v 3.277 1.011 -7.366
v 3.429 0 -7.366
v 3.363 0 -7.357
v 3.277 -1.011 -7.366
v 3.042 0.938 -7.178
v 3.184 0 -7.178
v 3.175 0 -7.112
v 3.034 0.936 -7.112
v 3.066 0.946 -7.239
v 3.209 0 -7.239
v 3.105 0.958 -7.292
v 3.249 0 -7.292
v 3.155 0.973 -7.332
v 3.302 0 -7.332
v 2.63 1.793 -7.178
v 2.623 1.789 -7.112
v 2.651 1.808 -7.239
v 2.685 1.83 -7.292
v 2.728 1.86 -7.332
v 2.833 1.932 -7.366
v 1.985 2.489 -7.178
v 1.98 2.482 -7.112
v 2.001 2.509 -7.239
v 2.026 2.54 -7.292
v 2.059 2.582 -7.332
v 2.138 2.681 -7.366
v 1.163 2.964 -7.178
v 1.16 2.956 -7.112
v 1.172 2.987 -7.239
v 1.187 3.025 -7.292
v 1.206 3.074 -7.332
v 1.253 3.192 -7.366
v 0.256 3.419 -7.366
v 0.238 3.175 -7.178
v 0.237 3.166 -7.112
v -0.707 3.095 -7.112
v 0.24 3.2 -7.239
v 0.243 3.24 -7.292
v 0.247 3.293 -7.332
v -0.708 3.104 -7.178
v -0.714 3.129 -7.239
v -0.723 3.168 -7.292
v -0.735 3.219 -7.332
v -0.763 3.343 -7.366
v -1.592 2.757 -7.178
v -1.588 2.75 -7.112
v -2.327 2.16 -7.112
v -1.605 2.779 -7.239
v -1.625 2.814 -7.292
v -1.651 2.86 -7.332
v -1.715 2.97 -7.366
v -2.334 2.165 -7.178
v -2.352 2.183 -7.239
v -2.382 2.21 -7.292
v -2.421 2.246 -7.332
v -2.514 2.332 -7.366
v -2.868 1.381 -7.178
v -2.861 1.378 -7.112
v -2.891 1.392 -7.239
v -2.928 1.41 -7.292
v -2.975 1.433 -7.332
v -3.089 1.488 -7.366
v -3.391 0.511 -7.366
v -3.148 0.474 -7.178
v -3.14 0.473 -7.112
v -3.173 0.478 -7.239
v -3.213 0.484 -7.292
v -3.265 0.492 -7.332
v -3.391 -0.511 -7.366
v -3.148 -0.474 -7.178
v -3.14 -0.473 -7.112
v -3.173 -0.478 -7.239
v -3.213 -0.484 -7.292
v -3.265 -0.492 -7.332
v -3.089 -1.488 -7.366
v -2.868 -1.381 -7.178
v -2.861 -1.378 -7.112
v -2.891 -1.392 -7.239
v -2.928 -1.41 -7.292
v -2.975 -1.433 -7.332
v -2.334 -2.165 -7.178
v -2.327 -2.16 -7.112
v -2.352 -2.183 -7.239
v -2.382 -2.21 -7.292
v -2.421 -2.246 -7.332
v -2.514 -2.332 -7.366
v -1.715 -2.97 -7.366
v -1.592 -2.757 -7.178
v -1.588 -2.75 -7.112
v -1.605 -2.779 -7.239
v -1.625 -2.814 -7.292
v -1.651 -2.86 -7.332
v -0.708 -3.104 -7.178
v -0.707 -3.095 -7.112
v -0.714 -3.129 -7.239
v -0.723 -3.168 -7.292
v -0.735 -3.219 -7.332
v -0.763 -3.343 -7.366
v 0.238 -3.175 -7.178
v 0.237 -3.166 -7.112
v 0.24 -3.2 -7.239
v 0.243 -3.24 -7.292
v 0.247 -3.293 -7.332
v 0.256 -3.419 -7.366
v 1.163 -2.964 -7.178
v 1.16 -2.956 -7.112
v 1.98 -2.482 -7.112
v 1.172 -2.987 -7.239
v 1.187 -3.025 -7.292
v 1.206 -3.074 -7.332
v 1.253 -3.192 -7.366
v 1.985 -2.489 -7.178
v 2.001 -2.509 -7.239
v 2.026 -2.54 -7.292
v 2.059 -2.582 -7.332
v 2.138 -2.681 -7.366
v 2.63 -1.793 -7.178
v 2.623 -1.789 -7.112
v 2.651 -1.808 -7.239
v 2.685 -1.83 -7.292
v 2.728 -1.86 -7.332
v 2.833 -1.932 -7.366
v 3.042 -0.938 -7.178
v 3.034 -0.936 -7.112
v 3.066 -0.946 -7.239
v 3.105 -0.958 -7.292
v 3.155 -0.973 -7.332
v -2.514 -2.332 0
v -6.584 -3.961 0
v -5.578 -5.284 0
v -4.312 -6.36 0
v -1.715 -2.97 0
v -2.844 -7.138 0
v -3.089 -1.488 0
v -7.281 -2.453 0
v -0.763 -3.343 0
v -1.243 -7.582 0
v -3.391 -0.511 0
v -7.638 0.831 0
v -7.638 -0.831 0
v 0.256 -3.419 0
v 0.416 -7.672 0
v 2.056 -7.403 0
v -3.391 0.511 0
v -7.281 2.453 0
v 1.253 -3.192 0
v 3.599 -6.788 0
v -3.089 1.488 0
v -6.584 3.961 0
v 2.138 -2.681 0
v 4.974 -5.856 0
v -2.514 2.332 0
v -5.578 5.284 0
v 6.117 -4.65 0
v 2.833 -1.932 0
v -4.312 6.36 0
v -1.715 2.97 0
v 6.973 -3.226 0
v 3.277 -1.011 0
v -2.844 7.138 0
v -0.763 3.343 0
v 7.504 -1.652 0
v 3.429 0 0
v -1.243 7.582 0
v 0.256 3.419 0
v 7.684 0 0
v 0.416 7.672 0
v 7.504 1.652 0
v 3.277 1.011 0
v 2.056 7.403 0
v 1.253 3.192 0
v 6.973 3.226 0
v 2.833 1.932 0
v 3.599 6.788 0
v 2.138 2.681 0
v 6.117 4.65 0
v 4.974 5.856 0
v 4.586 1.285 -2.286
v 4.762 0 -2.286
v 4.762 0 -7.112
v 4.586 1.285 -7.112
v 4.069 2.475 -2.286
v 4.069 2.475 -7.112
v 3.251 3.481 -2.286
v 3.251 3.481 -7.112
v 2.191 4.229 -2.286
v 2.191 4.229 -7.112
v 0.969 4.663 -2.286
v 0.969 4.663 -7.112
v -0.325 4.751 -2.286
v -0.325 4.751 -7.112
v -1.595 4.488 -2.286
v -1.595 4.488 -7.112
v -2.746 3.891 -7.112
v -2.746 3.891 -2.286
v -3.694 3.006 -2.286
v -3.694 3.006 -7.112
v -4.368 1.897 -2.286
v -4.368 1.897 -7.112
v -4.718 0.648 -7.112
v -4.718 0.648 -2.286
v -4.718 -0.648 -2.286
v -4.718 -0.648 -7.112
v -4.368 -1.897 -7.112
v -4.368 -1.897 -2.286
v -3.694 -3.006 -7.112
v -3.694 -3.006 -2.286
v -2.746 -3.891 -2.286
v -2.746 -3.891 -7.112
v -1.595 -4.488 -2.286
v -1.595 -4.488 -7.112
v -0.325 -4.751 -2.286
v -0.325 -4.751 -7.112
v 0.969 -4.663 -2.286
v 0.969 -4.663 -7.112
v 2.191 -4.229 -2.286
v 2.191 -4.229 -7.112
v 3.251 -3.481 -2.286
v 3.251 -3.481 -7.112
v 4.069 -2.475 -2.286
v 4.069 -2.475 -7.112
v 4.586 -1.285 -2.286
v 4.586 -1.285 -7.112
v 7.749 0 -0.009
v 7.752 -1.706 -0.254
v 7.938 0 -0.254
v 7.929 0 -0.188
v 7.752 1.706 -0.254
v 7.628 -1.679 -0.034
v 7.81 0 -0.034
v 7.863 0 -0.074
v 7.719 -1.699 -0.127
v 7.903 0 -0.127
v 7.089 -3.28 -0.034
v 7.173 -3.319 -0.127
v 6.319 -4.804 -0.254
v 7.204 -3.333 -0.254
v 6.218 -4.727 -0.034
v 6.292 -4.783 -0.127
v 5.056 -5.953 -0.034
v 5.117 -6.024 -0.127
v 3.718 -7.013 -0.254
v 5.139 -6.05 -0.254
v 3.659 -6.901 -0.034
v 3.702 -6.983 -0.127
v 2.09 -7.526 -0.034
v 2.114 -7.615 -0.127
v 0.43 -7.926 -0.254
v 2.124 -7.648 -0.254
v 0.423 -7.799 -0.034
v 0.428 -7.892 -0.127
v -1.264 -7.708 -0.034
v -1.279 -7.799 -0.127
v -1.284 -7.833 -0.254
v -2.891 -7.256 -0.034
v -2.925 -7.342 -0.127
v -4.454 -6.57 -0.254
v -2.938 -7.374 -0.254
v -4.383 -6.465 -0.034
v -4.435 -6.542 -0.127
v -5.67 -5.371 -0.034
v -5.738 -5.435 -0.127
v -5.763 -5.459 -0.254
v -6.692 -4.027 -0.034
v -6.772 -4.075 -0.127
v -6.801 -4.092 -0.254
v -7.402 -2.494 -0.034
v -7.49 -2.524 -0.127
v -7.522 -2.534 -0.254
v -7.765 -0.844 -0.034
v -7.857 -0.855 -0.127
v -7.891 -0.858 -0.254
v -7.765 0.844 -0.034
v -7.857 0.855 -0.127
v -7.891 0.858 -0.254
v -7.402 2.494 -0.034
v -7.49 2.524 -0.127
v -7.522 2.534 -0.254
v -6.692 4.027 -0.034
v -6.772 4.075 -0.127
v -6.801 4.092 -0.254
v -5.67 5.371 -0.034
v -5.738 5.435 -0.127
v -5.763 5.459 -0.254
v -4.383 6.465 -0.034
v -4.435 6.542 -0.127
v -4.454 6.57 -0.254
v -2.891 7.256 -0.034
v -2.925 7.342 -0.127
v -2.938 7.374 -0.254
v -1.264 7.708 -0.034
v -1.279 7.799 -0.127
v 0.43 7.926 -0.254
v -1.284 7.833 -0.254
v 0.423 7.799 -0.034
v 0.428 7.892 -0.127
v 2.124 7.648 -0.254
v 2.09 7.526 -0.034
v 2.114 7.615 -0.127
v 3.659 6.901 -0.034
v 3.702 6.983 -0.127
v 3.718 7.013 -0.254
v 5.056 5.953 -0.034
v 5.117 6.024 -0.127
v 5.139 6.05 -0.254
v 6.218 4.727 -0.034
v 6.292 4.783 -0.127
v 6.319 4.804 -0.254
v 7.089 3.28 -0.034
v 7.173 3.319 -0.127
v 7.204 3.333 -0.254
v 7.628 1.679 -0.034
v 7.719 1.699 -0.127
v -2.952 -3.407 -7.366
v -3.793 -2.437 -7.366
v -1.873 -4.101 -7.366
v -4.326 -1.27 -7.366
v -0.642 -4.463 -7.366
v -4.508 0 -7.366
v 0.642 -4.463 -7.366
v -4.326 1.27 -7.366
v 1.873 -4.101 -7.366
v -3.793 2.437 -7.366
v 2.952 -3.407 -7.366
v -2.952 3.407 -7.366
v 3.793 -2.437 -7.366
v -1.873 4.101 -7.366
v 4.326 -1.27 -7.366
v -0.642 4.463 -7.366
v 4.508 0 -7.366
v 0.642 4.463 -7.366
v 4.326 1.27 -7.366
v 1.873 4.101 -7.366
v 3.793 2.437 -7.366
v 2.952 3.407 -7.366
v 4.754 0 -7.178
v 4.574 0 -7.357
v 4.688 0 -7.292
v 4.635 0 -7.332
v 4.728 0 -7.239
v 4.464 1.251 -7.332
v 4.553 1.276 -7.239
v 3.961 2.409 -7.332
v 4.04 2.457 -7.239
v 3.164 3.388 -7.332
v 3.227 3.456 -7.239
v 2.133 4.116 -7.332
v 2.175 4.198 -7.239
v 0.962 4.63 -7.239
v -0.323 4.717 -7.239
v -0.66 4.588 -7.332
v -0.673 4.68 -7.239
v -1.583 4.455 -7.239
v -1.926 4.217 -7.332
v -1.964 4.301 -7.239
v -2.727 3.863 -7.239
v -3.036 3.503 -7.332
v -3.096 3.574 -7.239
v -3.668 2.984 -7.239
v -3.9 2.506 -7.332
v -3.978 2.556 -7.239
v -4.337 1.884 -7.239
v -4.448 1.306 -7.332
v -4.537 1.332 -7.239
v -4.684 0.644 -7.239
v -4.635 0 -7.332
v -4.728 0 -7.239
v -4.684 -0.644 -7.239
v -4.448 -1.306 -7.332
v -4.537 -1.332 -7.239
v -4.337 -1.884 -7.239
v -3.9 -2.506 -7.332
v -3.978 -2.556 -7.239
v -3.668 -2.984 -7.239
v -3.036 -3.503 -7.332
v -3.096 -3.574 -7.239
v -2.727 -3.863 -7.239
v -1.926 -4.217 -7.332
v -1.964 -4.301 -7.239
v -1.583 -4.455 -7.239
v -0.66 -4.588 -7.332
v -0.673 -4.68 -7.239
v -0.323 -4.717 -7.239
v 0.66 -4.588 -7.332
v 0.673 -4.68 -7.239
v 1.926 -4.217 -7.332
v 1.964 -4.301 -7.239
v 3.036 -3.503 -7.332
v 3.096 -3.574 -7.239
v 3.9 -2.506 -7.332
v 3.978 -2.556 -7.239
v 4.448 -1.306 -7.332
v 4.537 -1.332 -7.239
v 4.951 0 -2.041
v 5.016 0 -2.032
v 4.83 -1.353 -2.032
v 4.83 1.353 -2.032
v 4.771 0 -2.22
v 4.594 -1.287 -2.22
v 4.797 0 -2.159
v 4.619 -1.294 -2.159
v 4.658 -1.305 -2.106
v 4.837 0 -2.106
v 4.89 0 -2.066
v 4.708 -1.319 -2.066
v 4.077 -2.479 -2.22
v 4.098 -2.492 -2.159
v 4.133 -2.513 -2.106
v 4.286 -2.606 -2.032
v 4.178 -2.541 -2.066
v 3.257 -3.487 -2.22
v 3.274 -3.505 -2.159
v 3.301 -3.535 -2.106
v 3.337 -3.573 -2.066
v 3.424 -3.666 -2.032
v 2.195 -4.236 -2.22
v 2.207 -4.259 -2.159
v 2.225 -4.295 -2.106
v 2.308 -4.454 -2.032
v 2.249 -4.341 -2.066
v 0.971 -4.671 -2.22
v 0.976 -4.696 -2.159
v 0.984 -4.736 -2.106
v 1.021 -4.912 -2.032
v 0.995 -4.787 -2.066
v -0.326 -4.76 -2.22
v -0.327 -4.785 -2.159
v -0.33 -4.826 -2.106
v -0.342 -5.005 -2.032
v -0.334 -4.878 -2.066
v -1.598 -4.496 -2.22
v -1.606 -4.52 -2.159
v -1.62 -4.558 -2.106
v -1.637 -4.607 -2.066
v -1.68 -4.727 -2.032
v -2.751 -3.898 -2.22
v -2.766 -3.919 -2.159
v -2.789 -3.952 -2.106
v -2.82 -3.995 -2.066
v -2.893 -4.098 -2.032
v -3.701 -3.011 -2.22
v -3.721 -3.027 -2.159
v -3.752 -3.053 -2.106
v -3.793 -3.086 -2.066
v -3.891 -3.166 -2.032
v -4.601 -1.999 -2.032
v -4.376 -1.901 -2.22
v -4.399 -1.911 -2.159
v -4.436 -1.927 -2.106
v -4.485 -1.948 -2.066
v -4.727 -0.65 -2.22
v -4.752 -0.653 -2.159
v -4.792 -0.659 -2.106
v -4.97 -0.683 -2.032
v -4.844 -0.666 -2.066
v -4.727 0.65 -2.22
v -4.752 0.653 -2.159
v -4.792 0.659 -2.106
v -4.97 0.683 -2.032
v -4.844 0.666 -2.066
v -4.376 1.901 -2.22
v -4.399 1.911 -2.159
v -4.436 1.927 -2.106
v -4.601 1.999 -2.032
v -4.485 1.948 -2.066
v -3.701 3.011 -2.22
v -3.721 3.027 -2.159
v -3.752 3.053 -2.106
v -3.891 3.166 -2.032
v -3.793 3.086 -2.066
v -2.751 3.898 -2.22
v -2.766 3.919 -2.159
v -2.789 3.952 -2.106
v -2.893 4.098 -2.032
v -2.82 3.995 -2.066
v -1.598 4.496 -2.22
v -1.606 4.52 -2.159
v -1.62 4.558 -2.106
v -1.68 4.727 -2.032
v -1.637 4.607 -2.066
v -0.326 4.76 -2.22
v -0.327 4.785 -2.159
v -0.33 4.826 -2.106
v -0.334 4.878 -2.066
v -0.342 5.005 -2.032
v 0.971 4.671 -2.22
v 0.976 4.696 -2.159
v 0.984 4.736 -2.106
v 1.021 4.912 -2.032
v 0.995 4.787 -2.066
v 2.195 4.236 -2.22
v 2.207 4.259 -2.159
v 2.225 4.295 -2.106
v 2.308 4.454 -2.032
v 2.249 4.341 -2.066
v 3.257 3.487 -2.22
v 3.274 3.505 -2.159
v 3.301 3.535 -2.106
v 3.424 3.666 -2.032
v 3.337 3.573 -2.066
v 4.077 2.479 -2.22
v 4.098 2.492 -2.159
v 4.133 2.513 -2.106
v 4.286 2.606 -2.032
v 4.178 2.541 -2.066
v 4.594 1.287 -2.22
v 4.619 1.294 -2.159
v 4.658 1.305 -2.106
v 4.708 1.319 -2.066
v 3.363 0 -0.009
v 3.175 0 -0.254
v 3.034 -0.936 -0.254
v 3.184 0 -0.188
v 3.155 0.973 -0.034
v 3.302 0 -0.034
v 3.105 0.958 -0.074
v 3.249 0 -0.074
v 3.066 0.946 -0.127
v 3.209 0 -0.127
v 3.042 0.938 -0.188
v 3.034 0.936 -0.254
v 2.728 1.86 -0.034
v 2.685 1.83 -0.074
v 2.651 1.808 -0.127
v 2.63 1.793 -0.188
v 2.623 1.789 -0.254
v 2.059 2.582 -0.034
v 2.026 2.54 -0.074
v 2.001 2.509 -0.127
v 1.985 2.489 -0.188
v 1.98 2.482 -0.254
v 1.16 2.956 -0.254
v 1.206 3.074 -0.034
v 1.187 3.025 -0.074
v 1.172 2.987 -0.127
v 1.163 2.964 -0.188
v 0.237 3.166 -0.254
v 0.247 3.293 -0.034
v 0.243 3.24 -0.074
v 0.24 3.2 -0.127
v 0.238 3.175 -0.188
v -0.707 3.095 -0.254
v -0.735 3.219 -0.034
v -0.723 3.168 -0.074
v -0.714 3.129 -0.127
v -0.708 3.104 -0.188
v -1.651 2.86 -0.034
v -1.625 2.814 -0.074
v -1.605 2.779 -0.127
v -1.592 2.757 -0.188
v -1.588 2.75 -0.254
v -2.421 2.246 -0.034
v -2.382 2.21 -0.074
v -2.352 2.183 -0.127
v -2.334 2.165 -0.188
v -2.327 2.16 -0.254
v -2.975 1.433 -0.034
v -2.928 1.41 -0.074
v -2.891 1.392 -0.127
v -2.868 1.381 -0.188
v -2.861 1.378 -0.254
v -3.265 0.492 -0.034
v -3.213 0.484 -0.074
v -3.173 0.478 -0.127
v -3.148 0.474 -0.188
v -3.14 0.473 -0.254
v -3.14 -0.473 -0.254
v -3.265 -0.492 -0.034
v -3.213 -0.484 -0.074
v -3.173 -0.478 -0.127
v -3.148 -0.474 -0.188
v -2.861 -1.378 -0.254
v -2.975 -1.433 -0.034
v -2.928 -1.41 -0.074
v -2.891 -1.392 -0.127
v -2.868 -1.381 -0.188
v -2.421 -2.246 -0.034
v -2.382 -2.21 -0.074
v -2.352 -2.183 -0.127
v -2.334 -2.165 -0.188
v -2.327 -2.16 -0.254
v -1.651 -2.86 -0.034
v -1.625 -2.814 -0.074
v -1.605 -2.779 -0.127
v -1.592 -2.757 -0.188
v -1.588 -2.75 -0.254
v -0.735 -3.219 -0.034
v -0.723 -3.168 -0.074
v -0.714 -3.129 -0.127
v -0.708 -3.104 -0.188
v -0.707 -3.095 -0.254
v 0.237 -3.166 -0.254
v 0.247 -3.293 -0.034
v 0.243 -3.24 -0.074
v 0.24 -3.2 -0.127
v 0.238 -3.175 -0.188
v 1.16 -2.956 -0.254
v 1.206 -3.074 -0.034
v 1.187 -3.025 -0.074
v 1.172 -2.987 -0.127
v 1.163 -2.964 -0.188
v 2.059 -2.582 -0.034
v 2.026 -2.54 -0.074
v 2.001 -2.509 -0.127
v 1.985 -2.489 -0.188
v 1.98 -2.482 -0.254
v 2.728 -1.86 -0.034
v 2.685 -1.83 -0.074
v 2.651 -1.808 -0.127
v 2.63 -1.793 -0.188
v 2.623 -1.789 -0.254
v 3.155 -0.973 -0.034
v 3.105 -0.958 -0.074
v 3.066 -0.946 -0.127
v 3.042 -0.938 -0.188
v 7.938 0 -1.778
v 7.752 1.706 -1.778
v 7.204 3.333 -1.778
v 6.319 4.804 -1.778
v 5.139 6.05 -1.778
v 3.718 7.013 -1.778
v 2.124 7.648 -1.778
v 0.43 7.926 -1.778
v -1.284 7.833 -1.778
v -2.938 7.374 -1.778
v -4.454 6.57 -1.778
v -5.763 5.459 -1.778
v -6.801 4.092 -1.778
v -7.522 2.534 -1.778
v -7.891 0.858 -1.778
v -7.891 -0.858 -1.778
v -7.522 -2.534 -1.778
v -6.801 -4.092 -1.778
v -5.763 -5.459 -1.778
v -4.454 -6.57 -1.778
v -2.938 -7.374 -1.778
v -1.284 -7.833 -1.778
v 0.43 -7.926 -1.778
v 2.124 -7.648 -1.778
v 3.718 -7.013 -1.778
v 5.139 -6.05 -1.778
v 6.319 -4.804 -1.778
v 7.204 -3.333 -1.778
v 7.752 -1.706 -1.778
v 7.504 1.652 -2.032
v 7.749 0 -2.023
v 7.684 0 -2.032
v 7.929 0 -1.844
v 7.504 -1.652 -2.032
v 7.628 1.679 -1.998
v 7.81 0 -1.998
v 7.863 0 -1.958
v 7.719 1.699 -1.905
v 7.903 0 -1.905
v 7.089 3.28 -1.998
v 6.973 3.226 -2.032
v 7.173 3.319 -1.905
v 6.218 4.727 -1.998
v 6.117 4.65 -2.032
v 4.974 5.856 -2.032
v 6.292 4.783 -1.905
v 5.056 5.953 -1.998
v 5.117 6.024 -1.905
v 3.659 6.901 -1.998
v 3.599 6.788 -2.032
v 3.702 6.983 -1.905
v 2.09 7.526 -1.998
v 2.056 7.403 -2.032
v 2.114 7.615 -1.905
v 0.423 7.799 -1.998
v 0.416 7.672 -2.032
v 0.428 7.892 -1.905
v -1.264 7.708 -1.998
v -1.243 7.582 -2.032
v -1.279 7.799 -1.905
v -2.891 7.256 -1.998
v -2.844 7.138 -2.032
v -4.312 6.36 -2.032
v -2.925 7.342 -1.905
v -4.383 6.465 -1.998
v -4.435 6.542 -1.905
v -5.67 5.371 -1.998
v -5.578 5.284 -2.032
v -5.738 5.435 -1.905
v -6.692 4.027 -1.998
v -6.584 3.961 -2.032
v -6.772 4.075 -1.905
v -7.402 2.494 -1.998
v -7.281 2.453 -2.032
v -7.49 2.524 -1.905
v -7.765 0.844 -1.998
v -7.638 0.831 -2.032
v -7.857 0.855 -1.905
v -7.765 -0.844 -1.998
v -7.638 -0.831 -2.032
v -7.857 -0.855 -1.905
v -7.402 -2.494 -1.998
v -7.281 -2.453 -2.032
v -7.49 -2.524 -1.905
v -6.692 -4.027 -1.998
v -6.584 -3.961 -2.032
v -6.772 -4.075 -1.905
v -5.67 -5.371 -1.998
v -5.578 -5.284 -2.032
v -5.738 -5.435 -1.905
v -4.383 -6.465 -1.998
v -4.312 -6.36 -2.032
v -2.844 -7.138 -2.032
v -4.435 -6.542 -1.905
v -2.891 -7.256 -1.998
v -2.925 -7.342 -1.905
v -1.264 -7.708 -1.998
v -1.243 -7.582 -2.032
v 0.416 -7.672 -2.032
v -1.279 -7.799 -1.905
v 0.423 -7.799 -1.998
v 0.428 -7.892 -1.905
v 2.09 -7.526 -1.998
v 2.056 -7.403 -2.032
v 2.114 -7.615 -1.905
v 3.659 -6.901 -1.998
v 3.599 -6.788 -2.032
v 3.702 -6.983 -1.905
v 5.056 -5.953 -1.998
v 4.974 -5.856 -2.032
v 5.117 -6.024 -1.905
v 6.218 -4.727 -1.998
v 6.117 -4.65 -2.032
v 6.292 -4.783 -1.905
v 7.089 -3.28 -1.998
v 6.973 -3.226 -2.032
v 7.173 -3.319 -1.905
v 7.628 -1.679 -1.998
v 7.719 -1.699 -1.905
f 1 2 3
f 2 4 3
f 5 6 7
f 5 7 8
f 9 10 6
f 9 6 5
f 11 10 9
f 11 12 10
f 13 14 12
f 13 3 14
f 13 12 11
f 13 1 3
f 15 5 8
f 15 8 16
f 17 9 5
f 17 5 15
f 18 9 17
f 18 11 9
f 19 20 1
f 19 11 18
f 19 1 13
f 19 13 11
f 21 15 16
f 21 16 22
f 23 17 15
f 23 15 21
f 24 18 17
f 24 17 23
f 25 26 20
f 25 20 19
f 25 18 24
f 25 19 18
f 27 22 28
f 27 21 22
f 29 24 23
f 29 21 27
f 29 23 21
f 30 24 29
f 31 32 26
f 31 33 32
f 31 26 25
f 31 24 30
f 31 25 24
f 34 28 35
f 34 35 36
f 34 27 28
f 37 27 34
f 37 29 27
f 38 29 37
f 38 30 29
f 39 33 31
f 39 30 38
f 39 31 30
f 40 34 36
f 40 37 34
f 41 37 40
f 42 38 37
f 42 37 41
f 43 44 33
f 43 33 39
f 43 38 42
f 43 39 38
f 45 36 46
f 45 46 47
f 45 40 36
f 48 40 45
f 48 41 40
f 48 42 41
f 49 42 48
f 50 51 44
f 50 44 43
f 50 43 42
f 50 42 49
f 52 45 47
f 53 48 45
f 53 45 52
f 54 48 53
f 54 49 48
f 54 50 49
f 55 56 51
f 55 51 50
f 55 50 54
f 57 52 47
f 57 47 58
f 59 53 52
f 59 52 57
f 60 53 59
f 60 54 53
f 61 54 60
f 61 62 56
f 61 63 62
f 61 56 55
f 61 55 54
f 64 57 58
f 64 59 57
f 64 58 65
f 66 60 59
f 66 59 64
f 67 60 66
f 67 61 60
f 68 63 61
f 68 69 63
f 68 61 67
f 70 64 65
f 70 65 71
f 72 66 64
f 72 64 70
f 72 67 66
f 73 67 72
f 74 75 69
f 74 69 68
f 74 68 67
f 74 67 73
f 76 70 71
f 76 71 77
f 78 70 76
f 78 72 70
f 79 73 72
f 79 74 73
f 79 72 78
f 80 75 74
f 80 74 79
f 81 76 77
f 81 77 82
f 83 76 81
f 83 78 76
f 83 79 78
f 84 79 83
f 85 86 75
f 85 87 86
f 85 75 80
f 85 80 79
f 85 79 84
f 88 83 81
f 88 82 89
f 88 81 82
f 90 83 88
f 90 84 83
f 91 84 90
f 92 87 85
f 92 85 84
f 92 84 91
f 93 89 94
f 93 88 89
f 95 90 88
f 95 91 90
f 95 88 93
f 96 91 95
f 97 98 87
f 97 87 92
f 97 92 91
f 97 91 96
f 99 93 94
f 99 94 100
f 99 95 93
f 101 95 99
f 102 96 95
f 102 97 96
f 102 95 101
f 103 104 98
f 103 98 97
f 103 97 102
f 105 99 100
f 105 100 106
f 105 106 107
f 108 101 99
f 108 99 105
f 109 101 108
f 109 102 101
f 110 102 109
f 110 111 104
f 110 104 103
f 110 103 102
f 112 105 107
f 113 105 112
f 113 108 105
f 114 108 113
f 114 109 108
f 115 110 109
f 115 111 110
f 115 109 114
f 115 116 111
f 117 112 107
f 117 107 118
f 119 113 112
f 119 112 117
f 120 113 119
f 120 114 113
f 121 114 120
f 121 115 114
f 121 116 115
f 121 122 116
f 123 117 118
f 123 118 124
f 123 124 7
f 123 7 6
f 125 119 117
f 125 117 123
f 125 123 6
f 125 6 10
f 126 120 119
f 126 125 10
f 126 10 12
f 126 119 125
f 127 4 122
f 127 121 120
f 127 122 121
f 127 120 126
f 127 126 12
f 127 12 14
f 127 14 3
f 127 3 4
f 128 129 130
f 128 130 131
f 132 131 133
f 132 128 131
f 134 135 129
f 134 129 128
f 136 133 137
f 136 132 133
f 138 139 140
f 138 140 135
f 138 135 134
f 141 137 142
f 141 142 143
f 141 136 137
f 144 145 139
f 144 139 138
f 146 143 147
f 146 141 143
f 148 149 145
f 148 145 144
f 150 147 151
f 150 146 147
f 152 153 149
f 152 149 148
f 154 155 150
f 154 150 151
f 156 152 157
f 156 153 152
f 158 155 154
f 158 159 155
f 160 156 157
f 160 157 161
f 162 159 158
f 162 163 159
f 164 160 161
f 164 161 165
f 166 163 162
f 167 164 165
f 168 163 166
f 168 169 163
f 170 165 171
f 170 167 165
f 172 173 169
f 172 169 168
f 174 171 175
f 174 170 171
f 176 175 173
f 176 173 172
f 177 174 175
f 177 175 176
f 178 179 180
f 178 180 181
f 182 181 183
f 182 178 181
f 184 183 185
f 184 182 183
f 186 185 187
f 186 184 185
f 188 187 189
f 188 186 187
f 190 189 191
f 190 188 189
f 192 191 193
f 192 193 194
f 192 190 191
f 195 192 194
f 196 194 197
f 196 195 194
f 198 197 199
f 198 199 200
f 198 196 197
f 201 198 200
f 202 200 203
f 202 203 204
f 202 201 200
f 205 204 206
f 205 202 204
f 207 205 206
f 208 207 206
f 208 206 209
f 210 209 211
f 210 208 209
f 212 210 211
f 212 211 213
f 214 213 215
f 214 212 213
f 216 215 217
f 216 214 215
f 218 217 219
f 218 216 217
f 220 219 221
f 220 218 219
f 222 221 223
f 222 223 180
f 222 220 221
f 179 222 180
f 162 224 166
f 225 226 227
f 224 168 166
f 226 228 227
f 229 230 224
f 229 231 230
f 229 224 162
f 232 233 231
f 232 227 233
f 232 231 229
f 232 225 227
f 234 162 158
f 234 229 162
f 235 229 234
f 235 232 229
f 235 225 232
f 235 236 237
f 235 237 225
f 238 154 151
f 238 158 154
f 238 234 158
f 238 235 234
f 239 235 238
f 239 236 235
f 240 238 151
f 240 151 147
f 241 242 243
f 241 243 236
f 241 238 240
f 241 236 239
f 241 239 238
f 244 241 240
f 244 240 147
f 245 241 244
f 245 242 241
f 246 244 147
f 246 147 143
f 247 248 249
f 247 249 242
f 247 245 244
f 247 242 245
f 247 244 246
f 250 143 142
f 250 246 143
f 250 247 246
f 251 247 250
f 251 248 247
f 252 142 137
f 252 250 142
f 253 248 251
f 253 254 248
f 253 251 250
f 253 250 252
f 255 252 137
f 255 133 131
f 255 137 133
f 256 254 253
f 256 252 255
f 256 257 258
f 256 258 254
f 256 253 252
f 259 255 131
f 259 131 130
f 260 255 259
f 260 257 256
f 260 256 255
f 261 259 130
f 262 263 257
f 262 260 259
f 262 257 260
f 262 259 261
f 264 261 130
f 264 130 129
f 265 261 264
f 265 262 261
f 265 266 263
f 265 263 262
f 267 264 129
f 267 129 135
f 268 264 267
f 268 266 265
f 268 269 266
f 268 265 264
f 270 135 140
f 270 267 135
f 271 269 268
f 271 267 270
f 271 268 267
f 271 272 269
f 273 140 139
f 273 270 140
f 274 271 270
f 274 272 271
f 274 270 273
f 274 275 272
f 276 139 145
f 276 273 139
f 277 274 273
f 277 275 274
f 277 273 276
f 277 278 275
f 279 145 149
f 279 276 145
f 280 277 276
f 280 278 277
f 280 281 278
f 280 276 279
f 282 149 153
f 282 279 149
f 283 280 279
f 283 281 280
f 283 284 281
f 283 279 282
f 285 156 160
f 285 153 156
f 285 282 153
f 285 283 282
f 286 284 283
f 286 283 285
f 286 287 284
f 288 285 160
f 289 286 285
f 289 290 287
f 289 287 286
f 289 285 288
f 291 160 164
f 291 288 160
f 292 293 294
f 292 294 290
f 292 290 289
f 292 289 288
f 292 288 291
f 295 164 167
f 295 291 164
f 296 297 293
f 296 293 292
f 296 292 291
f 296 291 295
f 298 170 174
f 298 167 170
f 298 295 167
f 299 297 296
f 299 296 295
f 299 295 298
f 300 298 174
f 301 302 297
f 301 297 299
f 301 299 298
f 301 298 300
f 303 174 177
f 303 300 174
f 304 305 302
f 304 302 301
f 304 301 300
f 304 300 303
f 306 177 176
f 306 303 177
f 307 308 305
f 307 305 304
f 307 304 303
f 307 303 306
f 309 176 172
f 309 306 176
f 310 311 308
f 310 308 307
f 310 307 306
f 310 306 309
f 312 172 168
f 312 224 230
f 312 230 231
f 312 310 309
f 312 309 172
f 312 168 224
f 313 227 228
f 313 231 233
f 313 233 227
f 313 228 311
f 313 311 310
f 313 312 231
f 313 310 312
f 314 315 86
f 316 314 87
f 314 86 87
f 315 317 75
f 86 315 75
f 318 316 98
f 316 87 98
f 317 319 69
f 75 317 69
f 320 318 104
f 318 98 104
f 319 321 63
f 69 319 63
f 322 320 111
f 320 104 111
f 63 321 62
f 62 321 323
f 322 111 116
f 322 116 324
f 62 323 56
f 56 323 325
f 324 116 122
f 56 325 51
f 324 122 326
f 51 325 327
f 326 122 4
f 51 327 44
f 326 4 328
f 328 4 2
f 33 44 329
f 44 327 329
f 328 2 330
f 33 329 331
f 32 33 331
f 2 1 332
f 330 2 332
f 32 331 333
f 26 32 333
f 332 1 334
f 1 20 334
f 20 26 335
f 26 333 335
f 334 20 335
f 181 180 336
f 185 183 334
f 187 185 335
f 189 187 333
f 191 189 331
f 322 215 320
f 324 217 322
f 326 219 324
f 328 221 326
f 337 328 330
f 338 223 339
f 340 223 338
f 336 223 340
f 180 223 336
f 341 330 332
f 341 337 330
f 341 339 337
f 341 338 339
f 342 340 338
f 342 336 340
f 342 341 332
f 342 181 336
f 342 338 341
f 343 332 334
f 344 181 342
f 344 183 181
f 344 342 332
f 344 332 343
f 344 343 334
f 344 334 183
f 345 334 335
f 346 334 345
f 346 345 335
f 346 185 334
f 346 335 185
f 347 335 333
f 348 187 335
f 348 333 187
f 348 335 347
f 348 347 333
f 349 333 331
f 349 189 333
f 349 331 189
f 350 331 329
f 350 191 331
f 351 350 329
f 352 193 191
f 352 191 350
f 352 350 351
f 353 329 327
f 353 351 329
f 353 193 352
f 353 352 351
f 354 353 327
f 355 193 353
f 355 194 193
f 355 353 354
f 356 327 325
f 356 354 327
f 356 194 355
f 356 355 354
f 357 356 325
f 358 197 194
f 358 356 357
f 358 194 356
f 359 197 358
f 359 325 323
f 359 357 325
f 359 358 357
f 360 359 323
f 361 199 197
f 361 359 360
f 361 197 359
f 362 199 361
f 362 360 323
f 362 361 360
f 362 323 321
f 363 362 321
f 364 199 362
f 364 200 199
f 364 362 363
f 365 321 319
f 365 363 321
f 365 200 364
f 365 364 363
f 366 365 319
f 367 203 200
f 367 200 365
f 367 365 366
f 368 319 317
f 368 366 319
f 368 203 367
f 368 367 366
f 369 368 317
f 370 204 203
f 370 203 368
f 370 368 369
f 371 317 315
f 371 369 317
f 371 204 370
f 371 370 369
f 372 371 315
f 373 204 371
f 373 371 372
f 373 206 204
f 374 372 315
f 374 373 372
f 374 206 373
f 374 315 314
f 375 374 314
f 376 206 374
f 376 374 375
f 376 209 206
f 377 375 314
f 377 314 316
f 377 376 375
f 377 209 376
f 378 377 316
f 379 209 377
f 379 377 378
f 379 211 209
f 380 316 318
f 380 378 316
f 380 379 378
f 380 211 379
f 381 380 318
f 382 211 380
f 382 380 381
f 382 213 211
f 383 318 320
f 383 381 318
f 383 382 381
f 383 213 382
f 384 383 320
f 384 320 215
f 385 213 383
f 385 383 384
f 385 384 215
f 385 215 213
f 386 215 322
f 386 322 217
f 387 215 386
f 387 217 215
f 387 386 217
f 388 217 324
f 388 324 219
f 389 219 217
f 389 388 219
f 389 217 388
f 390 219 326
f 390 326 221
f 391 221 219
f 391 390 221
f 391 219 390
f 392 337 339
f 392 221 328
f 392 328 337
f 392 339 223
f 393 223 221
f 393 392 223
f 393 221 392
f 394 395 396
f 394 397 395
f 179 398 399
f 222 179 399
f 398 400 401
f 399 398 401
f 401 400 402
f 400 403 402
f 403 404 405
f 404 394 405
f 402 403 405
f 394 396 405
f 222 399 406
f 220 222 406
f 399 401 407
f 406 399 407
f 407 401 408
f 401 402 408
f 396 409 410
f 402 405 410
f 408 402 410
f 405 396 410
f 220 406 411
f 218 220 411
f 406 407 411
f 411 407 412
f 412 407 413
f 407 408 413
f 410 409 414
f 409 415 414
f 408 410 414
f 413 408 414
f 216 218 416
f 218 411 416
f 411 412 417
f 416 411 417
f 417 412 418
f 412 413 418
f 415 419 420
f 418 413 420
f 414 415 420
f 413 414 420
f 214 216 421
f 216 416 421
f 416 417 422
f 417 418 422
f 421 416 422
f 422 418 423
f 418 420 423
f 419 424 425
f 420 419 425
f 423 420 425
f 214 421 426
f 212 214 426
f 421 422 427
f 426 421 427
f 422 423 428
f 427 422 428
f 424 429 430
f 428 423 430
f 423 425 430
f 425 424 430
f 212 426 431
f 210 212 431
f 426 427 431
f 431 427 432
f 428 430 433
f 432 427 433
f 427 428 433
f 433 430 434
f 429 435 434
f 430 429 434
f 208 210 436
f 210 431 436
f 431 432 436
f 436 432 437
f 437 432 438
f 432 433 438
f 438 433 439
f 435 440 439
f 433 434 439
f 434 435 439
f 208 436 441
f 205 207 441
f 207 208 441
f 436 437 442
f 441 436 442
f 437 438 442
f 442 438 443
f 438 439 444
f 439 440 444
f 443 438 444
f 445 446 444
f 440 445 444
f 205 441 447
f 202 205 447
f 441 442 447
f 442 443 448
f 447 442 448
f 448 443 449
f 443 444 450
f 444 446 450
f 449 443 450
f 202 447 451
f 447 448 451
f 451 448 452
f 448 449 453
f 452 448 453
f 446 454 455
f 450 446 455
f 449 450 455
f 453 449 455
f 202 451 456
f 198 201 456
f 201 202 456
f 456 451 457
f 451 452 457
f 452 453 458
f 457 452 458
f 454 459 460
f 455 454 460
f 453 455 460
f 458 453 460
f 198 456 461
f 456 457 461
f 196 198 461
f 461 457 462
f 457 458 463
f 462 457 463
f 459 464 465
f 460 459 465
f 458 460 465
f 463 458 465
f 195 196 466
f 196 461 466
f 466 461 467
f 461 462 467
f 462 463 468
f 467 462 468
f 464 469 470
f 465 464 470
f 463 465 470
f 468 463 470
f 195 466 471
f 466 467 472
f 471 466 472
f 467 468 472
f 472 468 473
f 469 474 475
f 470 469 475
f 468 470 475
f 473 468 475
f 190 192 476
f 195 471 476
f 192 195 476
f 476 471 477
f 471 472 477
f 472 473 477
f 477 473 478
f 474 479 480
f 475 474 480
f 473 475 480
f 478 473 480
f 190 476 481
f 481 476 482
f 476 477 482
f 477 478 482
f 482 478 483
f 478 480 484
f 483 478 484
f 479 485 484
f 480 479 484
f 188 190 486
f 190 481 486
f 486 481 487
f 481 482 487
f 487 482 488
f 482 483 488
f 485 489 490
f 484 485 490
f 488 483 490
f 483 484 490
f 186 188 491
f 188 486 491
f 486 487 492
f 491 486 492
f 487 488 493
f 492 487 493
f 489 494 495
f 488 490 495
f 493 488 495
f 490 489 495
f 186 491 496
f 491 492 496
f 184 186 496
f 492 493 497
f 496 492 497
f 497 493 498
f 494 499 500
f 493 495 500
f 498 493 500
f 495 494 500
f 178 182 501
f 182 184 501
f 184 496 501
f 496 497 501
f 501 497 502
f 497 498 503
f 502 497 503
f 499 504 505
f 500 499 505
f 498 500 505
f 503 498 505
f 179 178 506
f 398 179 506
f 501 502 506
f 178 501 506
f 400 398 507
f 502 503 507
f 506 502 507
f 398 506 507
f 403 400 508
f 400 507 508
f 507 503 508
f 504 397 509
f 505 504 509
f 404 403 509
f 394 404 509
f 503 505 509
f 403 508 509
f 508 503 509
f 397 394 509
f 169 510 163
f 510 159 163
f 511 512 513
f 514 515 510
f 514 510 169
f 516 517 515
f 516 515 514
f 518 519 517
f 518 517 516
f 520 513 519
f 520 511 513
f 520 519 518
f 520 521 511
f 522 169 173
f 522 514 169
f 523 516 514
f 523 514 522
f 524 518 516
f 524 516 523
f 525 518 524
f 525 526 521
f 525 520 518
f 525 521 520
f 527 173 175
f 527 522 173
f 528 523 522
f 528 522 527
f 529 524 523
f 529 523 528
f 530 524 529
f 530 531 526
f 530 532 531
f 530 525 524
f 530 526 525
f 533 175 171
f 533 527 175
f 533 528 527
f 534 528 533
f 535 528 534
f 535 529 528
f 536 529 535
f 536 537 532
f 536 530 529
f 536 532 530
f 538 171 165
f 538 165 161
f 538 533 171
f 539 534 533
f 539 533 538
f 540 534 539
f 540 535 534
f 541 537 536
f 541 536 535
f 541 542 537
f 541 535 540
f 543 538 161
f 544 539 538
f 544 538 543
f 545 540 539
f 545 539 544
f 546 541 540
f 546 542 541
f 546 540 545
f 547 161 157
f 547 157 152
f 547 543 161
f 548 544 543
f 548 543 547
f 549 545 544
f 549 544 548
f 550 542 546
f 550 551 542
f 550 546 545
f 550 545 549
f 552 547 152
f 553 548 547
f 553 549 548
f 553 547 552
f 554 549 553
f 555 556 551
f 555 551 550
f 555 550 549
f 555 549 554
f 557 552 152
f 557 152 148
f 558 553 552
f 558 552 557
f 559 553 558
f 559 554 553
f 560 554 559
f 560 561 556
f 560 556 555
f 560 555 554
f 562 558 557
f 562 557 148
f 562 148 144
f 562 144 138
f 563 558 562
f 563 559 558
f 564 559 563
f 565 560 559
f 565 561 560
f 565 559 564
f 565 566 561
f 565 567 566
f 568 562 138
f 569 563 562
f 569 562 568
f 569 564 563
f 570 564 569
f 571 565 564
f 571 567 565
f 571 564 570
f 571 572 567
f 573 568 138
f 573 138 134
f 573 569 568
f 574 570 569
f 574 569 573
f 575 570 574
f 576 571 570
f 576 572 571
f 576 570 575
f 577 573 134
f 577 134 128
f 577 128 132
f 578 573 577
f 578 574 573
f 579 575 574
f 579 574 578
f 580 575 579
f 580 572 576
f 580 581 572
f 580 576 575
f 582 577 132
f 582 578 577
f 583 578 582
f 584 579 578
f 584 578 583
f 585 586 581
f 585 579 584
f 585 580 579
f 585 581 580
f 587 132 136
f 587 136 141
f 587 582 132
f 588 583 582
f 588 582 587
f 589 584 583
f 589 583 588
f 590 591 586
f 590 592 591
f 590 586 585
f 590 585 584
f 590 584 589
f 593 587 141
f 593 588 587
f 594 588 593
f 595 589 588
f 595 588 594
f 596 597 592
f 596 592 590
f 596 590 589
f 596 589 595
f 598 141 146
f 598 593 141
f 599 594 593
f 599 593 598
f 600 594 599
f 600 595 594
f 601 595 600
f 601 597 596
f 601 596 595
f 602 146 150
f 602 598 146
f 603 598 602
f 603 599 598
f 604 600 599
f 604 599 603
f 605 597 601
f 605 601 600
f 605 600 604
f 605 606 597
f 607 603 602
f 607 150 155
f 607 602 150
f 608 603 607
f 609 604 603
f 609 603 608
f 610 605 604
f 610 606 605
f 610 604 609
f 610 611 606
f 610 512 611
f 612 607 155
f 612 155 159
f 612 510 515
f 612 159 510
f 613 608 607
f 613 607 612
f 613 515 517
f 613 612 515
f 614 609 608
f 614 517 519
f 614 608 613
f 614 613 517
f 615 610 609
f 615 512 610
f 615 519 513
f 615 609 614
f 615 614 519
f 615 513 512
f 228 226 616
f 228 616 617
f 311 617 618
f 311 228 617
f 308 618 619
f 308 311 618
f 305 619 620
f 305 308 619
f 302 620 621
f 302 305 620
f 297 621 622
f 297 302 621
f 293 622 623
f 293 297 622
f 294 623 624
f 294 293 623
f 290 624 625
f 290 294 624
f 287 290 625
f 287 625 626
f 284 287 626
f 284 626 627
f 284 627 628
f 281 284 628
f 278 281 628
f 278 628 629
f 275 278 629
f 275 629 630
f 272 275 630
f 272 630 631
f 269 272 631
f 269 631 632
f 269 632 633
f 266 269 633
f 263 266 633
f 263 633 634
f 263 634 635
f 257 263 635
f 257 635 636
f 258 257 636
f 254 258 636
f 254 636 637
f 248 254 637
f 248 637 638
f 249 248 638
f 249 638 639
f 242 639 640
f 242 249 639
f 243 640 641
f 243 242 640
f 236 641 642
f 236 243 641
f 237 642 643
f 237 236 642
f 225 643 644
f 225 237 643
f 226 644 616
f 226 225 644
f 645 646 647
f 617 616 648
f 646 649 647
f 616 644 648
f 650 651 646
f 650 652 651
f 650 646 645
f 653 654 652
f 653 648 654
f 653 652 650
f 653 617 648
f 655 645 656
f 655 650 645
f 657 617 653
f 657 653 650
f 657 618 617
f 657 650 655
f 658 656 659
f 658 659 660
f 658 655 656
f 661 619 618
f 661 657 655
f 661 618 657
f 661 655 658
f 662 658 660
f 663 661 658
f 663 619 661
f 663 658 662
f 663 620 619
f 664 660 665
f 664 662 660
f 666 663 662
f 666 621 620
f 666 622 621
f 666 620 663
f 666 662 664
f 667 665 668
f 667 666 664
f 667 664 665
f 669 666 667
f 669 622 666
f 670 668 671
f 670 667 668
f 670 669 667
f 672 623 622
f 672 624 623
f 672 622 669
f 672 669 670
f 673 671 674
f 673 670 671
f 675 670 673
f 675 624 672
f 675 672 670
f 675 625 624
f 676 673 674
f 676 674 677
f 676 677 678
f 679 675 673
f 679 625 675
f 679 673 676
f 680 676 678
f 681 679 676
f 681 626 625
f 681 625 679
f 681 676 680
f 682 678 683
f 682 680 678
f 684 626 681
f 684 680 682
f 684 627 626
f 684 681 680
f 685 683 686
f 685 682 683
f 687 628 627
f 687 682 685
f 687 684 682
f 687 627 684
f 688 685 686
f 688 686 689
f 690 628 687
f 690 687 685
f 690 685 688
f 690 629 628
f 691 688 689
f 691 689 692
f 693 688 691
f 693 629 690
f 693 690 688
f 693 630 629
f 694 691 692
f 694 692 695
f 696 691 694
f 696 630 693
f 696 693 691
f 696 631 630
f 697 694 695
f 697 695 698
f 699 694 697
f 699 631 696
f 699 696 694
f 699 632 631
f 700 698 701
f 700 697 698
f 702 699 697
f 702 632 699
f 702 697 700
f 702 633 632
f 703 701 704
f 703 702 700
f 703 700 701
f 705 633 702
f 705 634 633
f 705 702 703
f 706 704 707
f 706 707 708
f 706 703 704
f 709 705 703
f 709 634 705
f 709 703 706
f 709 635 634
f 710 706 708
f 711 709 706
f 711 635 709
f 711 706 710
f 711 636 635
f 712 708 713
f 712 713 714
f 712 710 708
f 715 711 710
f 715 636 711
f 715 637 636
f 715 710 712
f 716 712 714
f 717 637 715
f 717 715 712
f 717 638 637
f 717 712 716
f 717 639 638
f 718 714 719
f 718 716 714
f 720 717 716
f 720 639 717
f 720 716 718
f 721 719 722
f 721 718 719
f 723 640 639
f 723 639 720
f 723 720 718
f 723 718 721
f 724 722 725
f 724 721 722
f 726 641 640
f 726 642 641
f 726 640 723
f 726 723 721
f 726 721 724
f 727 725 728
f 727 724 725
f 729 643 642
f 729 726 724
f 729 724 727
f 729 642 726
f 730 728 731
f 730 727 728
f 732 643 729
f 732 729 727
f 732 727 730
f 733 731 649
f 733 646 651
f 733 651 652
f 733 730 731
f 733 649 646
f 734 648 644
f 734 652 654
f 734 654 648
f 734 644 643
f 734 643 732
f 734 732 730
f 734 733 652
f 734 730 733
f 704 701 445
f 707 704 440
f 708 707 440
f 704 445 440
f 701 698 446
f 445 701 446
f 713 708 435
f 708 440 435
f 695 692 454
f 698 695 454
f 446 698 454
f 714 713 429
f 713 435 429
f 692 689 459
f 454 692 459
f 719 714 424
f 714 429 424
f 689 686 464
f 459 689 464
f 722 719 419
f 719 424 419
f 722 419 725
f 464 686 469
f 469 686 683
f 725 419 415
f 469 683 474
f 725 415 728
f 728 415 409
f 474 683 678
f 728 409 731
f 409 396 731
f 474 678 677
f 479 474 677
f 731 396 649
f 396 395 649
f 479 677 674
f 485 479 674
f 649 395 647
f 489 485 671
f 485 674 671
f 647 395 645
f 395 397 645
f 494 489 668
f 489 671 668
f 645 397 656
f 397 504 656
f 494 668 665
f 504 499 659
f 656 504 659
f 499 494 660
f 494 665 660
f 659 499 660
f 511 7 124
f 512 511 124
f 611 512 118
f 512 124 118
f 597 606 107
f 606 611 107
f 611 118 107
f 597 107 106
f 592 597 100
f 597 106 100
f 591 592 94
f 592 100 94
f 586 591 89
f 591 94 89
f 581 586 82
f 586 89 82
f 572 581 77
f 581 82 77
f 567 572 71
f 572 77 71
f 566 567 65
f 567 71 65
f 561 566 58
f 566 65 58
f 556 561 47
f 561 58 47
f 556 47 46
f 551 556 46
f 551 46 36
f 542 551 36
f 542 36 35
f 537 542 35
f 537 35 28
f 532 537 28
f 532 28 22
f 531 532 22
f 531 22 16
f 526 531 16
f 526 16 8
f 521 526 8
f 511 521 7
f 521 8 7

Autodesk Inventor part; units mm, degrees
ref_plane "YZ Plane" through (0, 0, 0) normal (1, 0, 0) x (0, 1, 0)
ref_plane "XZ Plane" through (0, 0, 0) normal (0, 1, 0) x (-1, 0, 0)
ref_plane "XY Plane" through (0, 0, 0) normal (0, 0, 1) x (1, 0, 0)
sketch "Sketch2" plane through (0, 0, 0) normal (0, 1, 0) x (-1, 0, 0)
  line L0 (0, -8.8392) -> (0, 1.4732) construction
  line L1 (-7.9375, 0) -> (-3.175, 0)
  line L2 (-3.175, 0) -> (-3.175, -7.366)
  line L3 (-3.175, -7.366) -> (-4.7625, -7.366)
  line L4 (-4.7625, -7.366) -> (-4.7625, -2.032)
  line L5 (-4.7625, -2.032) -> (-7.9375, -2.032)
  line L6 (-7.9375, -2.032) -> (-7.9375, 0)
  point P0 (0, 0)
  dimension "d0" = 2.032
  dimension "d1" = 6.35
  dimension "d2" = 9.525
  dimension "d5" = 15.875
  dimension "d9" = 7.366
revolve "Revolution1" add sketch "Sketch2" angle 360 about axis through (0, 0, 0) along (0, 0, 1)
fillet "Fillet1" radius 0.254 6 edges at (-4.7625, 0, -2.032) (-7.9375, 0, -2.032) (-7.9375, 0, 0) (-4.7625, 0, -7.366) (-3.175, 0, -7.366) (-3.175, 0, 0)
properties part number "BUSHING,SHAFT,END_EFFECTOR,ARM" material "Brass, Soft Yellow"
